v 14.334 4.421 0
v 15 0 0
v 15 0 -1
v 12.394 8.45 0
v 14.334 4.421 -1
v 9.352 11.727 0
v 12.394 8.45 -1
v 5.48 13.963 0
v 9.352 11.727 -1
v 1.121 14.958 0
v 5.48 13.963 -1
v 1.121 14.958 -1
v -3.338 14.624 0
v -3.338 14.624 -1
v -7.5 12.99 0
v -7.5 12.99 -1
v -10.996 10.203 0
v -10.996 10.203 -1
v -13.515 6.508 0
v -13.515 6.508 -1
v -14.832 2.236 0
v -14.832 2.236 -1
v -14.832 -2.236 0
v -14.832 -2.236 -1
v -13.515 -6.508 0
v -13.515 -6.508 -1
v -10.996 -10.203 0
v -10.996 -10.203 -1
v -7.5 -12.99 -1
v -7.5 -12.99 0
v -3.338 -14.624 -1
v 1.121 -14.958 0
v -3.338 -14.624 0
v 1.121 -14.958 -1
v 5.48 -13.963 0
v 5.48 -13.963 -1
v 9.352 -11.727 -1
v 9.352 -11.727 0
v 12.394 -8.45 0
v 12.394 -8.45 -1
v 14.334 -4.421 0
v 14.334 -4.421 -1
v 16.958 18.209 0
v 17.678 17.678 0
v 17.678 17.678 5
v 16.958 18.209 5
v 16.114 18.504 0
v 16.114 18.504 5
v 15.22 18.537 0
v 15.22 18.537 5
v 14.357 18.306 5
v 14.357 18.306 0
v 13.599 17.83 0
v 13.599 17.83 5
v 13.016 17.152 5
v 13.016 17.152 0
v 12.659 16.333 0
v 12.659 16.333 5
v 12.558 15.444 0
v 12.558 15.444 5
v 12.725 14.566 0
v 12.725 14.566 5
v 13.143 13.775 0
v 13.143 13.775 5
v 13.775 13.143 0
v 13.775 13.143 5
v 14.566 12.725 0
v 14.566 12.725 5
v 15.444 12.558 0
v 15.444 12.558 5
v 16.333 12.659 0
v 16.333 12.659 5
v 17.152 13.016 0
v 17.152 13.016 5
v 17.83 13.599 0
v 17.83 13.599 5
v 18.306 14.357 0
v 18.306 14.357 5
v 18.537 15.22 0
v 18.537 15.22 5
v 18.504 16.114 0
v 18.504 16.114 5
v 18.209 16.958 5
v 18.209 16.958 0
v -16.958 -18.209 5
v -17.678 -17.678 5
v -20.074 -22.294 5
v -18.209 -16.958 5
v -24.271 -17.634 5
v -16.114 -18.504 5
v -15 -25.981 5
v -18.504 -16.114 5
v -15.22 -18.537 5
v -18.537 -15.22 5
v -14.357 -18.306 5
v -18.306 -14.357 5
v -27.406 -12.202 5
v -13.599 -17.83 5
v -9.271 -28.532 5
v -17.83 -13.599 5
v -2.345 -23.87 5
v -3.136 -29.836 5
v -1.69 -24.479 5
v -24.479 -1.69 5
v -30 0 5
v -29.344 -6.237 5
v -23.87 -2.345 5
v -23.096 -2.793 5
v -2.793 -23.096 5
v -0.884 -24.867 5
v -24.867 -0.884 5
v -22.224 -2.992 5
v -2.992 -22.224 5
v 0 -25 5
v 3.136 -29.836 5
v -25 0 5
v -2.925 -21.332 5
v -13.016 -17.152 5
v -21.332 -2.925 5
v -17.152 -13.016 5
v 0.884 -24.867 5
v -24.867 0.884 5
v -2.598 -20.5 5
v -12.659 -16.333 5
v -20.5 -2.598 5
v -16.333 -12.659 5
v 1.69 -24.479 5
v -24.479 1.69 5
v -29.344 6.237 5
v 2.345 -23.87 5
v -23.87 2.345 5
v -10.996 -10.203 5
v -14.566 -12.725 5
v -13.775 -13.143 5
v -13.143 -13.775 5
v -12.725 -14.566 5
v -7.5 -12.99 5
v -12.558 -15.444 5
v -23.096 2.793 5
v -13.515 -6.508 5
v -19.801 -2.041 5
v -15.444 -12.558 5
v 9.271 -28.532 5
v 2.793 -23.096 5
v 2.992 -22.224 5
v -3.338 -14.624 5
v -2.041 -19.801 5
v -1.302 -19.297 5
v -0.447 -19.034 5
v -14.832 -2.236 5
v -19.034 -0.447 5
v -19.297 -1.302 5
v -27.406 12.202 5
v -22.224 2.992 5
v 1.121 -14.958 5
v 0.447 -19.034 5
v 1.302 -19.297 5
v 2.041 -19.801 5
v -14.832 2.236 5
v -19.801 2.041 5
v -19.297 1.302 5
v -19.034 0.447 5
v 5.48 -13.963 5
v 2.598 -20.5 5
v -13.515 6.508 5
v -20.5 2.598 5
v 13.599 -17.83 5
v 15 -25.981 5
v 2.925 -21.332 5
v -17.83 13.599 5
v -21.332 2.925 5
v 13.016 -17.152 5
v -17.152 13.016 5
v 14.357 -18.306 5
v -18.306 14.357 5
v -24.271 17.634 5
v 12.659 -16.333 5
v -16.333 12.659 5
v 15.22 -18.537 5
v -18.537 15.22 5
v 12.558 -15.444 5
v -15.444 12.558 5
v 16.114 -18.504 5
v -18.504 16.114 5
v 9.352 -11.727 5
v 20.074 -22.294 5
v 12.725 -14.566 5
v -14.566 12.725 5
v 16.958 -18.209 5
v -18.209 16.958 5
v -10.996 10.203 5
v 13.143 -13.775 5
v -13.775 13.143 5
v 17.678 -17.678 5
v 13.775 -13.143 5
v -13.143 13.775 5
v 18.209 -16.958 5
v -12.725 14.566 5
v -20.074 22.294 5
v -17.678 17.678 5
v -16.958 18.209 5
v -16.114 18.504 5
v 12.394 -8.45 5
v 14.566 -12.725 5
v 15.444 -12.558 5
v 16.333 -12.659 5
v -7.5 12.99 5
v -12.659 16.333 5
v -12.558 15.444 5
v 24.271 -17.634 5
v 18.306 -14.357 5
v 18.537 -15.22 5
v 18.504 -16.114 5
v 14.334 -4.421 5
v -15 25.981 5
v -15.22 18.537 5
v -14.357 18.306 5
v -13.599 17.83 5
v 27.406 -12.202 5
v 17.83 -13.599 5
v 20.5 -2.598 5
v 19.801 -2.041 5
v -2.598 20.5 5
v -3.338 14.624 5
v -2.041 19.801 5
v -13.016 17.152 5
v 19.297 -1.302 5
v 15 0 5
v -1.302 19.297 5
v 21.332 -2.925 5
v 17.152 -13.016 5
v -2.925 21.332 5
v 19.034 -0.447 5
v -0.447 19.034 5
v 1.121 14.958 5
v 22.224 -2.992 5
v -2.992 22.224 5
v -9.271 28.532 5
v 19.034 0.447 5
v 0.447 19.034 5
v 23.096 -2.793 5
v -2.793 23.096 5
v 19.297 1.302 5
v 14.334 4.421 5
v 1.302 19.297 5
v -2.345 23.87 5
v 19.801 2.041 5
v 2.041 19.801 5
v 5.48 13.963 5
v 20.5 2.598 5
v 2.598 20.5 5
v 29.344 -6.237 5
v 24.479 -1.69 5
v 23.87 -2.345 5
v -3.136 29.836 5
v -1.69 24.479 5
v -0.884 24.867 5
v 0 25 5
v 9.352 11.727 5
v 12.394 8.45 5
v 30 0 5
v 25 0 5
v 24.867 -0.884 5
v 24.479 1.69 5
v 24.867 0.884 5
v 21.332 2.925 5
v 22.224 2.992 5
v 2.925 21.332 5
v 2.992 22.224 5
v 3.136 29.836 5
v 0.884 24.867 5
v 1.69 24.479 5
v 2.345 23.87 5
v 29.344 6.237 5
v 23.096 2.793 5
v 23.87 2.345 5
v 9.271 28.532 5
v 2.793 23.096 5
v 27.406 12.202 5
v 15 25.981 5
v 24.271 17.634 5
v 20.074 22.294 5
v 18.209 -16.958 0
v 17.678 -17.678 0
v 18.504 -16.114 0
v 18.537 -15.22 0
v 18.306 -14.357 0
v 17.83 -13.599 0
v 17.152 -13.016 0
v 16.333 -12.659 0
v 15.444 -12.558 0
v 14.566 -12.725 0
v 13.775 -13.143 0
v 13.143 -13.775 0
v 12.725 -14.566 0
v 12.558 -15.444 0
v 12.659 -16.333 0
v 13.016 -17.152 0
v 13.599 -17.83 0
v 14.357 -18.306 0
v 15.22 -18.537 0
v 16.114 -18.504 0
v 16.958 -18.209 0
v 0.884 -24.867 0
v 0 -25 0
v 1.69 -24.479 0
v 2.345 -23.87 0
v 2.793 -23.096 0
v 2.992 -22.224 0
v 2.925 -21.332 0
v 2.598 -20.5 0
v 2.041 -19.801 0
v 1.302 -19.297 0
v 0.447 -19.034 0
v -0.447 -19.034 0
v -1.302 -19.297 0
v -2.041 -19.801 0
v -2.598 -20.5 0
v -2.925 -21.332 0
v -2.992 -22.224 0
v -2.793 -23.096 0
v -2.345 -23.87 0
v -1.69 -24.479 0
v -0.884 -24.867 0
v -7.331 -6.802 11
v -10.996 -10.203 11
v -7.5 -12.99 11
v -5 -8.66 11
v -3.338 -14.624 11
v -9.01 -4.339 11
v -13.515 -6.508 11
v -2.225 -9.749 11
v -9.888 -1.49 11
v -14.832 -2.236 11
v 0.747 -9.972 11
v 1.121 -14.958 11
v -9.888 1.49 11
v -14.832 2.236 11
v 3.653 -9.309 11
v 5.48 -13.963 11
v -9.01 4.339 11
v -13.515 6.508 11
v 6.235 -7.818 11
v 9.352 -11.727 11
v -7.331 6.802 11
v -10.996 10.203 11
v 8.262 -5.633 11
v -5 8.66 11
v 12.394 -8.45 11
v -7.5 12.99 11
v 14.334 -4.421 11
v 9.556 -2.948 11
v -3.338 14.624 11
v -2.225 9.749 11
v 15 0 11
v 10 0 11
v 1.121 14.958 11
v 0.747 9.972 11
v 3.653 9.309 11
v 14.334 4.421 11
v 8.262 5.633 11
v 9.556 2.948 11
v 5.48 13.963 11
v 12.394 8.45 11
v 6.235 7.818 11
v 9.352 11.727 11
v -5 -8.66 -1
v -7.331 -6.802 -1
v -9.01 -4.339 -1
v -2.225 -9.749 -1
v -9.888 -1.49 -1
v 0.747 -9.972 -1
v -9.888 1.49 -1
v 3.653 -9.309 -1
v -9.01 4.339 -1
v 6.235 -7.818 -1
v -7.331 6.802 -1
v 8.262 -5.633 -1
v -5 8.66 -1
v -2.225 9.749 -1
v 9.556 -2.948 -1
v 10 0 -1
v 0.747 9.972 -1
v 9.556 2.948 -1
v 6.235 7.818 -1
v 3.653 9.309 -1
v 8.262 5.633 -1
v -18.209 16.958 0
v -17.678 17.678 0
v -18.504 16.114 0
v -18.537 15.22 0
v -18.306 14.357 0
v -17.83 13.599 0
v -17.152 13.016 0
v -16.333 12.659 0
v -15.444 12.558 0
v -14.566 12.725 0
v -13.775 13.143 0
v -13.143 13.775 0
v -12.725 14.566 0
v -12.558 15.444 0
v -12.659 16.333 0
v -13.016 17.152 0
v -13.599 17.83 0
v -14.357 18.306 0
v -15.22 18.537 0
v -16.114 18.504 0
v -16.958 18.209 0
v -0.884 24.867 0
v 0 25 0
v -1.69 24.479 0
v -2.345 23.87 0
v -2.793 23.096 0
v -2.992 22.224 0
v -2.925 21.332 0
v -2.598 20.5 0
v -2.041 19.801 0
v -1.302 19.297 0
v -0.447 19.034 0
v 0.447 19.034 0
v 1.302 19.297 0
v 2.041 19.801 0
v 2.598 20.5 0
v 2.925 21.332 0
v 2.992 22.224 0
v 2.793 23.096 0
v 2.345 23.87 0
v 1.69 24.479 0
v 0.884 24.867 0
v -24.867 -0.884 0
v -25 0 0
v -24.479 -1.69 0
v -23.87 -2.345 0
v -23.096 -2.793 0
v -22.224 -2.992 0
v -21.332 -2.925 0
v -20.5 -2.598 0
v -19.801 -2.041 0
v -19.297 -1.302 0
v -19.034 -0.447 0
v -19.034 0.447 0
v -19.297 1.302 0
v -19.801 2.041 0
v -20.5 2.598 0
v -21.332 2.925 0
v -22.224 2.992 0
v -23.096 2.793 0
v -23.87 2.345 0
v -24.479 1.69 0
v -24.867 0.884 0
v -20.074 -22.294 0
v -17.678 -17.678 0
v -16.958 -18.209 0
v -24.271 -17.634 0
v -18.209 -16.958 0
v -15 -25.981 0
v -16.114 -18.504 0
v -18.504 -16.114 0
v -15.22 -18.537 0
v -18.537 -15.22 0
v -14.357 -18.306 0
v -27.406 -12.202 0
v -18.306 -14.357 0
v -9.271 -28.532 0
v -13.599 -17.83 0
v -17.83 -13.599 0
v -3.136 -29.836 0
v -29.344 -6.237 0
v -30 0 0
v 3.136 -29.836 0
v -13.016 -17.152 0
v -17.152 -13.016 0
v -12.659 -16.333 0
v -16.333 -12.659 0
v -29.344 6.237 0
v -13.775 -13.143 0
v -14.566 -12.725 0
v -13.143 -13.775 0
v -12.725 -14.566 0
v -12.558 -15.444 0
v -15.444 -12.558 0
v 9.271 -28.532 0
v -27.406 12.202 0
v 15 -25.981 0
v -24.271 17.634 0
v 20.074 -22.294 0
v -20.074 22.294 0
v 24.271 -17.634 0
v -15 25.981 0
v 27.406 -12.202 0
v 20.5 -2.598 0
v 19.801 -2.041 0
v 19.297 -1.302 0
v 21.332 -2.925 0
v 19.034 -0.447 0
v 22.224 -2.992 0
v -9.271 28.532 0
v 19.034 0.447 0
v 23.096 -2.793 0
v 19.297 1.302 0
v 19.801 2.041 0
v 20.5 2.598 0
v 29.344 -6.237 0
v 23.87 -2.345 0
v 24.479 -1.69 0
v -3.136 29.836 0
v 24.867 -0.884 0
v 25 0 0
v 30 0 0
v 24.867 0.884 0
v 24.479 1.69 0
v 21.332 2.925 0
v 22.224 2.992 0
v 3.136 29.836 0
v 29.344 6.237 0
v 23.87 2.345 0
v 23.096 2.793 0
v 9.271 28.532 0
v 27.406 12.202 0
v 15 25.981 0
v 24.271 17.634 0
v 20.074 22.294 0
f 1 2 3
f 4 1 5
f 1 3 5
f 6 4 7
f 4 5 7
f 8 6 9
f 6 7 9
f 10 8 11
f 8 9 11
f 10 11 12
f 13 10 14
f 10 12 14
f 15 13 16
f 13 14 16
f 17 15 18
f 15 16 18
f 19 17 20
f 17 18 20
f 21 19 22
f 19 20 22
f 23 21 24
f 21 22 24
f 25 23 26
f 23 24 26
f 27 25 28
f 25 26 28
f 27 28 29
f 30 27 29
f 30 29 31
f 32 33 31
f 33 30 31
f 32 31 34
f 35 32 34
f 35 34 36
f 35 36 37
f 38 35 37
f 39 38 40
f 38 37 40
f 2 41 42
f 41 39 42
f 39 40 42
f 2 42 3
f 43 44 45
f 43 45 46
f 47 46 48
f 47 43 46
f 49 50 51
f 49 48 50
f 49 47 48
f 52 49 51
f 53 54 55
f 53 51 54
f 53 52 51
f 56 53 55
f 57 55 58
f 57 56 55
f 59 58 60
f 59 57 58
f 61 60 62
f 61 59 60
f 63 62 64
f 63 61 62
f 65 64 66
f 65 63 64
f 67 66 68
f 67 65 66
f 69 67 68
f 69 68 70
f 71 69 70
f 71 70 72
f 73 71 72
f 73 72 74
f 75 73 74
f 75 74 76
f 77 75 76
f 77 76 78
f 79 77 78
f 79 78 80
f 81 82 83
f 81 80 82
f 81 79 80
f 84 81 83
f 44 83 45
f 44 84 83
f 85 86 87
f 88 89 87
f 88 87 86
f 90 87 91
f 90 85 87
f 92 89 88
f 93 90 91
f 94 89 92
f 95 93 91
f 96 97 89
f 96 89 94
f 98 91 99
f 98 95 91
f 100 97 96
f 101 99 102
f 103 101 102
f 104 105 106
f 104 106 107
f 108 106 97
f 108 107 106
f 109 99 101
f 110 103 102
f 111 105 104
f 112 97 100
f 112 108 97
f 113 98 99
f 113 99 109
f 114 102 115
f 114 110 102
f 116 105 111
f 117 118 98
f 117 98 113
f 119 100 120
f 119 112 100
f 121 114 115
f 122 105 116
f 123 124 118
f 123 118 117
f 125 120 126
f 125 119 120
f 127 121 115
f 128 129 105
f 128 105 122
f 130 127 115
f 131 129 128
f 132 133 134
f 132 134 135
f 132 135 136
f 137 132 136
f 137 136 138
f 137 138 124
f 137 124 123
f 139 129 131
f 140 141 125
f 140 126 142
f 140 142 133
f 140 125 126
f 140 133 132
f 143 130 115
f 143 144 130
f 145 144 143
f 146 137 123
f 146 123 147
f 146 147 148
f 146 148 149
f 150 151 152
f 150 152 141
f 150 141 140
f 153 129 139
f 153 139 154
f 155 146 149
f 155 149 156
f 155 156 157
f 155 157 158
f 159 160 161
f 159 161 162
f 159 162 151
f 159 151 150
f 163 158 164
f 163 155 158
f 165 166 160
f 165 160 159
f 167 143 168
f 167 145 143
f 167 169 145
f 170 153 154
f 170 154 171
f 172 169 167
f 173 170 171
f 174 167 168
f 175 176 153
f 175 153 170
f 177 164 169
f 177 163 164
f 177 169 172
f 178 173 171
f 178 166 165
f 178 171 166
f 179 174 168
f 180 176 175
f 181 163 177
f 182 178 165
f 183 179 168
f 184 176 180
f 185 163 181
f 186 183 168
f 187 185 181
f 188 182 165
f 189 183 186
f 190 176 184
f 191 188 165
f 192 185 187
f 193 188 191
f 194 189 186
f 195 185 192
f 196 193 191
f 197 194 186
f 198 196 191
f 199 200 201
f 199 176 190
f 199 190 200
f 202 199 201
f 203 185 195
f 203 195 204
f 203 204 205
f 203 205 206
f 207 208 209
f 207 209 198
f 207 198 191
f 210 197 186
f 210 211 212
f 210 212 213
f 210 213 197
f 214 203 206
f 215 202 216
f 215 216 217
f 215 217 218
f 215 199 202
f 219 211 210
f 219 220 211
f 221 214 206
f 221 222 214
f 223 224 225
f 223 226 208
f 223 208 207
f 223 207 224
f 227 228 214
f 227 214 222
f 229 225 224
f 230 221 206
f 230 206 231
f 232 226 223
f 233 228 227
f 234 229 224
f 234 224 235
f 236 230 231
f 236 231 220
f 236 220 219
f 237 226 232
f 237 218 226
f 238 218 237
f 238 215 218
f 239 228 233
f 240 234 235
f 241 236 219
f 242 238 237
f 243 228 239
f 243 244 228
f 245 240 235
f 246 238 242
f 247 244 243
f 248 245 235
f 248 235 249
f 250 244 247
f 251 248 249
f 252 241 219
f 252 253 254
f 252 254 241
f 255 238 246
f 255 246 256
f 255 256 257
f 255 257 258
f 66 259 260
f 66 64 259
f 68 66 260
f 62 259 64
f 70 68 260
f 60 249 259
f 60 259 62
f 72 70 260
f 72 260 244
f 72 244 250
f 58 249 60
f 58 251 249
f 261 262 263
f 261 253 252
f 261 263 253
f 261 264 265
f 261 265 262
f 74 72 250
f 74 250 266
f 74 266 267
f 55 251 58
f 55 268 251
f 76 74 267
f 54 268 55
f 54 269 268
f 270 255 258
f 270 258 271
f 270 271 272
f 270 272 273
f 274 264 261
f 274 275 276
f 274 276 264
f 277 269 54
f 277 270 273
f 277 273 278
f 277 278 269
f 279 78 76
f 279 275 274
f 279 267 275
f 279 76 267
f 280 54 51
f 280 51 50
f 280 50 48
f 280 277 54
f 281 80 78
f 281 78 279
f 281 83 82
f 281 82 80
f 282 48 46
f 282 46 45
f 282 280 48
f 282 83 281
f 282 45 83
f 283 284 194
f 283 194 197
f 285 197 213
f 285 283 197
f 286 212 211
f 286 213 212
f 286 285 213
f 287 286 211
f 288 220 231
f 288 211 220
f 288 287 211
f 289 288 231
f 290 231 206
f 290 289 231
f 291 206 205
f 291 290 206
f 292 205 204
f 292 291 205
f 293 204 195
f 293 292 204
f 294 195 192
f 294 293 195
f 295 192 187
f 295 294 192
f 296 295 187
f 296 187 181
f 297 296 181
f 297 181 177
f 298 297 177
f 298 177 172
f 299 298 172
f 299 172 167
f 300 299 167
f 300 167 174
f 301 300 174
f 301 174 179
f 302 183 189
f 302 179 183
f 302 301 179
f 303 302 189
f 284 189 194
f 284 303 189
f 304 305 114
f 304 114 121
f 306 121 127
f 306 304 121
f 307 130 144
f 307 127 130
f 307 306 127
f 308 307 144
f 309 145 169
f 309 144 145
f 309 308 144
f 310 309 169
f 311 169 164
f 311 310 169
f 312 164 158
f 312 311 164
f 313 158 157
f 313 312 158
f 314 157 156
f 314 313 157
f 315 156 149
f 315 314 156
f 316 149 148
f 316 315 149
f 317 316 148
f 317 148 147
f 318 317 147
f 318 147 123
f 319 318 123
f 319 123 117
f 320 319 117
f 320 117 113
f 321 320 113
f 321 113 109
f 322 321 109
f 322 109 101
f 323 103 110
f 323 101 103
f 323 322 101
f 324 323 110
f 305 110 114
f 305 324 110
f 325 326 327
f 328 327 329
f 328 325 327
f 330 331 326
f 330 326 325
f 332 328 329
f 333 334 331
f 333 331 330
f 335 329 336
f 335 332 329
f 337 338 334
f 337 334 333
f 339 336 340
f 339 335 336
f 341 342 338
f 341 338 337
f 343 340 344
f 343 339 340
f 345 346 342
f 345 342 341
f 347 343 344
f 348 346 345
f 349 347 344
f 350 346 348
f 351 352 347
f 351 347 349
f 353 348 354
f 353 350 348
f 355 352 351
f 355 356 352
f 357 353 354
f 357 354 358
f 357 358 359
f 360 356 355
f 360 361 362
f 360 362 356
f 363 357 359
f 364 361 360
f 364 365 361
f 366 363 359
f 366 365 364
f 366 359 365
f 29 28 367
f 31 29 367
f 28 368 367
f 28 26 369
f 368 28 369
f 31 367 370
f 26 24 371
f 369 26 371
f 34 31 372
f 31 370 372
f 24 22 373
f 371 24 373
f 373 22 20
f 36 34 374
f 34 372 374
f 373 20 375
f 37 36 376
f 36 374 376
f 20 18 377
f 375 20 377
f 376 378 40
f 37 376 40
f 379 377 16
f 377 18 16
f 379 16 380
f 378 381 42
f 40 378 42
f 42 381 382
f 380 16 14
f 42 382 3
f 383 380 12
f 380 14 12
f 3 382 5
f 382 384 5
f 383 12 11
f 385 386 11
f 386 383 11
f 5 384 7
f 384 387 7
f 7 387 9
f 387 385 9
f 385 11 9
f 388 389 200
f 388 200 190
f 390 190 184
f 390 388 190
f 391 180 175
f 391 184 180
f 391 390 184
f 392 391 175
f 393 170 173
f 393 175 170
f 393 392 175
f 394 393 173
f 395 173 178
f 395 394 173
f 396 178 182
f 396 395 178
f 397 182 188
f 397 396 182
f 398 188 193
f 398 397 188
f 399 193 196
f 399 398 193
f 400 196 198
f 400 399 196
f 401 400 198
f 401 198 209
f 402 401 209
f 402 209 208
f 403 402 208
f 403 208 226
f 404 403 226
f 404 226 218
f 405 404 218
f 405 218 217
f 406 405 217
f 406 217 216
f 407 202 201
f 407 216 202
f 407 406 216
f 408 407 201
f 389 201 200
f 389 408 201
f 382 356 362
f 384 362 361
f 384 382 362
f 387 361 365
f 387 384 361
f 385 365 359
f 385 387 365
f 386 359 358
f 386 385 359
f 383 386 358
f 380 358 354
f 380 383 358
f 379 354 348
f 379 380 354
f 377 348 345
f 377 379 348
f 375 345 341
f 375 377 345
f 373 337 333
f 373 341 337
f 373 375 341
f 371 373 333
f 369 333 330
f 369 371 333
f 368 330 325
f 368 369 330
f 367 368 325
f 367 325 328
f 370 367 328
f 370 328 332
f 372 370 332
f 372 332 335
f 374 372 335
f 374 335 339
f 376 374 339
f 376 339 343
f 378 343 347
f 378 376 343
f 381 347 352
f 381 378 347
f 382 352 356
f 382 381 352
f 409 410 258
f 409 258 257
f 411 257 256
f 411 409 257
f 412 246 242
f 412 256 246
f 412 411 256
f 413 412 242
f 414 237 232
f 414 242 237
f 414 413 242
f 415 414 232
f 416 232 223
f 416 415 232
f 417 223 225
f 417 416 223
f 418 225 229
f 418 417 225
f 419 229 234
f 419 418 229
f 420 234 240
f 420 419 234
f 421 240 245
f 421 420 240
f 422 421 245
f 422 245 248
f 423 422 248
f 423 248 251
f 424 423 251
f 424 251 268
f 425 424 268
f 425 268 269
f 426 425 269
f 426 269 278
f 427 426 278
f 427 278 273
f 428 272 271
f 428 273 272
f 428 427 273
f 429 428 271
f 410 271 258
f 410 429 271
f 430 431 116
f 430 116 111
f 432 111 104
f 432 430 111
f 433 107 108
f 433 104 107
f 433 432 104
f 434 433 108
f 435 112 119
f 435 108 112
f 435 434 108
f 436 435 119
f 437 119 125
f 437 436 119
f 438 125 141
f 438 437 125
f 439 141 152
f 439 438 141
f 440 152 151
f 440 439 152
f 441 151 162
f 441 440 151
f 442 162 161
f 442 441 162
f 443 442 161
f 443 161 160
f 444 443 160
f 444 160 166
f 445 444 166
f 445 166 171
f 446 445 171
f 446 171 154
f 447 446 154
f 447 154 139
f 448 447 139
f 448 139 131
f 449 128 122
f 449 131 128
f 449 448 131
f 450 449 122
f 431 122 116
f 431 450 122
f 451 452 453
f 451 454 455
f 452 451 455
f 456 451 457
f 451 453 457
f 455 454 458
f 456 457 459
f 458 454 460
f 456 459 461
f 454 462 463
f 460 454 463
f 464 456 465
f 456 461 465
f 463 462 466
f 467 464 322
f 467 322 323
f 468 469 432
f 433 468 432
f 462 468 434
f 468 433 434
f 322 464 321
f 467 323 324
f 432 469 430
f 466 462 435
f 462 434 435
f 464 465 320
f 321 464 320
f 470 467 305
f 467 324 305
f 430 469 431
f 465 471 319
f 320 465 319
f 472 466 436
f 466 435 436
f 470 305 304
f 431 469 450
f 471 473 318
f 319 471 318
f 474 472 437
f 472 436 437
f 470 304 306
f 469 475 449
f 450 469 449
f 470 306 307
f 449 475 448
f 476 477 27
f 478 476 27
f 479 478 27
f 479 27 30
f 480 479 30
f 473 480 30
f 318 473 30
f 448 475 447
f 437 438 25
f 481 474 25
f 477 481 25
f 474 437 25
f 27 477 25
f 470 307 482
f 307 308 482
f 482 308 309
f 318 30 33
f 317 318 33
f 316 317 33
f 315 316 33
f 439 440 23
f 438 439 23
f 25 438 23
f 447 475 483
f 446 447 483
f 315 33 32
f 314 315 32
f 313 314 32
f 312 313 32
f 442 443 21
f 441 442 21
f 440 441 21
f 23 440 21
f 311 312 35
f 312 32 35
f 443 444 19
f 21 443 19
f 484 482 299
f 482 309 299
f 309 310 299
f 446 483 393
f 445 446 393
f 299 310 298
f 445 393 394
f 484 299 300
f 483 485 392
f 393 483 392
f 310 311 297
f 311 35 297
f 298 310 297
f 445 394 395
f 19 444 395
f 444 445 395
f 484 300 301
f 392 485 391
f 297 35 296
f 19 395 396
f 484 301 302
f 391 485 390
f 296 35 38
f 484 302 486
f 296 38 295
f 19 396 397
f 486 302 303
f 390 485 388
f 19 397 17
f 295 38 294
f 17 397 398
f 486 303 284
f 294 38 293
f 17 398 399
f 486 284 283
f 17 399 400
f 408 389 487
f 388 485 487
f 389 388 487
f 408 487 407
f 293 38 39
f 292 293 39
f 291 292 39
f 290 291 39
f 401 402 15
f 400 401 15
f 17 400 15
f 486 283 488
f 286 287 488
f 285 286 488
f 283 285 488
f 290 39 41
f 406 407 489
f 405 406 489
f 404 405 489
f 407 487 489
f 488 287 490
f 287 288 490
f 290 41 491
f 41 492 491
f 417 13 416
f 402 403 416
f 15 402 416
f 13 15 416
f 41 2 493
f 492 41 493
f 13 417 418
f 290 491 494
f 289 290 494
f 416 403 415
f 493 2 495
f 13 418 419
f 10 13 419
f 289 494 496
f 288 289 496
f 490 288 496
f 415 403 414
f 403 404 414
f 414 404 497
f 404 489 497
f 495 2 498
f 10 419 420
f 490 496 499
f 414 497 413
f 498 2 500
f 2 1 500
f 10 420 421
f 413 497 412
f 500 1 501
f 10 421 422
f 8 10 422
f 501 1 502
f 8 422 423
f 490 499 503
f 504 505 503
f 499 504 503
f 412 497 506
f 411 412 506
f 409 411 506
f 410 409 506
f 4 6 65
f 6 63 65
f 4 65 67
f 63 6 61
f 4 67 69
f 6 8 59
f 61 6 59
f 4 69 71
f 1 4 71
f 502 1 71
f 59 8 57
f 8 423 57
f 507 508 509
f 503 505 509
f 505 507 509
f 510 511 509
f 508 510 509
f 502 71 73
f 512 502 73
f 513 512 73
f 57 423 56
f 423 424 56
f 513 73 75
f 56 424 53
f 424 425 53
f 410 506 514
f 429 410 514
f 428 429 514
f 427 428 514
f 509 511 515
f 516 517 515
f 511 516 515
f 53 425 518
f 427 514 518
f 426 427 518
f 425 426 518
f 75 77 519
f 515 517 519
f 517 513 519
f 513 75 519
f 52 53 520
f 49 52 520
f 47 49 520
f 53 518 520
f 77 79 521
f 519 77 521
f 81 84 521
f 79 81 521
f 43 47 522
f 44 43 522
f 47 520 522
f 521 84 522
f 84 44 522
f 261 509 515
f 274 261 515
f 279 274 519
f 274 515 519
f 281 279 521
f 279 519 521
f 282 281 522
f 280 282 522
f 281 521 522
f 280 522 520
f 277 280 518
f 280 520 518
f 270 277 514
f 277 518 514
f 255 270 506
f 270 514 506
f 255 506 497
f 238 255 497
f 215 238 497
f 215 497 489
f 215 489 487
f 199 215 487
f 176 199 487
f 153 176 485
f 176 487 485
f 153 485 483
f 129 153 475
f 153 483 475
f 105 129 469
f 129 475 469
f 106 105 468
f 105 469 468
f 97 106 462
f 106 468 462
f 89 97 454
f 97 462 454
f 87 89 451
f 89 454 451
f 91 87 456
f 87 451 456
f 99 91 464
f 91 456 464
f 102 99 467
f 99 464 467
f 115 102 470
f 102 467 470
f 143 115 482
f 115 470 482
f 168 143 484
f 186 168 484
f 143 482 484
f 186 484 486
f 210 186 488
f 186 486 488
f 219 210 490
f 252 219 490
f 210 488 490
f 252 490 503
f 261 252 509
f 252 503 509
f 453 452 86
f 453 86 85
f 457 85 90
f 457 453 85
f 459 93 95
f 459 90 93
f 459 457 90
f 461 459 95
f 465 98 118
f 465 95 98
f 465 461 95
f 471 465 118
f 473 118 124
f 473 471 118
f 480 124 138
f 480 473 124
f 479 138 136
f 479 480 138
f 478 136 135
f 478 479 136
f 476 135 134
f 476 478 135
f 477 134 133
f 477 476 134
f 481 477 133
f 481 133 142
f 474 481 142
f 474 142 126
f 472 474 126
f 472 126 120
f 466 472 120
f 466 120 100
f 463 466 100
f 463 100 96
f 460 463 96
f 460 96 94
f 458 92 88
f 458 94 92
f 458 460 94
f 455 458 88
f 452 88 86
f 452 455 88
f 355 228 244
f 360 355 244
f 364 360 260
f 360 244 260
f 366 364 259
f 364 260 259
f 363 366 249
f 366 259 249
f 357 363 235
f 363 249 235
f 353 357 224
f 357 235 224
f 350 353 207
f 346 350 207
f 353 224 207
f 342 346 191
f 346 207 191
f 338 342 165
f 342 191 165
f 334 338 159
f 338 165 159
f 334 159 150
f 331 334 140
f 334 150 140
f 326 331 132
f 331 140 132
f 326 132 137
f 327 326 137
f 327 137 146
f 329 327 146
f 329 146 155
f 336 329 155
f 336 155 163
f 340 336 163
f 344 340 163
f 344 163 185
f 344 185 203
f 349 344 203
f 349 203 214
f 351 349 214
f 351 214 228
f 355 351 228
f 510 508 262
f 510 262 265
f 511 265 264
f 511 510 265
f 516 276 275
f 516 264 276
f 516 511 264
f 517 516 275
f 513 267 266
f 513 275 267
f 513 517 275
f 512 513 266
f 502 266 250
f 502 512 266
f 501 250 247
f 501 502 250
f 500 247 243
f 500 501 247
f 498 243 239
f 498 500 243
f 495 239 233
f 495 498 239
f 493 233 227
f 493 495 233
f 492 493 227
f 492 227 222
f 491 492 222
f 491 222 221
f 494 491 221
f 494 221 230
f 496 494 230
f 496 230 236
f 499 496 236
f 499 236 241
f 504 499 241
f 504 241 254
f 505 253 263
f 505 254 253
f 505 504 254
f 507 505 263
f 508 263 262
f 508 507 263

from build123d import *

# Parameters (mm, degrees)
CYLINDER003_R     = 3
CYLINDER003_DEPTH = 10
ARRAY_COUNT       = 8
CYLINDER002_R     = 10
CYLINDER002_DEPTH = 30
CYLINDER001_R     = 15
CYLINDER001_DEPTH = 12
CYLINDER_R        = 30
CYLINDER_DEPTH    = 5


with BuildPart() as array:
    # Cylinder003 → Cylinder003 (new body)
    with BuildSketch(Plane(origin=(22, 0, 0), x_dir=(1, 0, 0), z_dir=(0, 0, 1))):
        Circle(CYLINDER003_R)
    extrude(amount=CYLINDER003_DEPTH)

    # Array: Array ×8 about axis
    array_axis = Axis((0, 0, 0), (0, 0, 1))


with BuildPart() as array_1:
    add(array.part)
    for i in range(1, ARRAY_COUNT):
        add(array.part.rotate(array_axis, i * 360 / ARRAY_COUNT))


with BuildPart() as array_2:
    # Array placement: moved
    add(array_1.part.moved(Location((0, 0, -1))))


with BuildPart() as tubo_interior:
    # Cylinder002 → Cylinder002 (new body)
    with BuildSketch(Plane.XY.offset(-1)):
        Circle(CYLINDER002_R)
    extrude(amount=CYLINDER002_DEPTH)


with BuildPart() as tubo_exterior:
    # Cylinder001 → Cylinder001 (new body)
    with BuildSketch(Plane.XY.offset(-1)):
        Circle(CYLINDER001_R)
    extrude(amount=CYLINDER001_DEPTH)


with BuildPart() as cut001:
    # Cylinder → Cylinder (new body)
    with BuildSketch(Plane.XY):
        Circle(CYLINDER_R)
    extrude(amount=CYLINDER_DEPTH)

    # Fusion: union tubo_exterior
    add(tubo_exterior.part)

    # Cut: cut tubo_interior
    add(tubo_interior.part, mode=Mode.SUBTRACT)

    # Cut001: cut Array
    add(array_2.part, mode=Mode.SUBTRACT)


solid = cut001.part
